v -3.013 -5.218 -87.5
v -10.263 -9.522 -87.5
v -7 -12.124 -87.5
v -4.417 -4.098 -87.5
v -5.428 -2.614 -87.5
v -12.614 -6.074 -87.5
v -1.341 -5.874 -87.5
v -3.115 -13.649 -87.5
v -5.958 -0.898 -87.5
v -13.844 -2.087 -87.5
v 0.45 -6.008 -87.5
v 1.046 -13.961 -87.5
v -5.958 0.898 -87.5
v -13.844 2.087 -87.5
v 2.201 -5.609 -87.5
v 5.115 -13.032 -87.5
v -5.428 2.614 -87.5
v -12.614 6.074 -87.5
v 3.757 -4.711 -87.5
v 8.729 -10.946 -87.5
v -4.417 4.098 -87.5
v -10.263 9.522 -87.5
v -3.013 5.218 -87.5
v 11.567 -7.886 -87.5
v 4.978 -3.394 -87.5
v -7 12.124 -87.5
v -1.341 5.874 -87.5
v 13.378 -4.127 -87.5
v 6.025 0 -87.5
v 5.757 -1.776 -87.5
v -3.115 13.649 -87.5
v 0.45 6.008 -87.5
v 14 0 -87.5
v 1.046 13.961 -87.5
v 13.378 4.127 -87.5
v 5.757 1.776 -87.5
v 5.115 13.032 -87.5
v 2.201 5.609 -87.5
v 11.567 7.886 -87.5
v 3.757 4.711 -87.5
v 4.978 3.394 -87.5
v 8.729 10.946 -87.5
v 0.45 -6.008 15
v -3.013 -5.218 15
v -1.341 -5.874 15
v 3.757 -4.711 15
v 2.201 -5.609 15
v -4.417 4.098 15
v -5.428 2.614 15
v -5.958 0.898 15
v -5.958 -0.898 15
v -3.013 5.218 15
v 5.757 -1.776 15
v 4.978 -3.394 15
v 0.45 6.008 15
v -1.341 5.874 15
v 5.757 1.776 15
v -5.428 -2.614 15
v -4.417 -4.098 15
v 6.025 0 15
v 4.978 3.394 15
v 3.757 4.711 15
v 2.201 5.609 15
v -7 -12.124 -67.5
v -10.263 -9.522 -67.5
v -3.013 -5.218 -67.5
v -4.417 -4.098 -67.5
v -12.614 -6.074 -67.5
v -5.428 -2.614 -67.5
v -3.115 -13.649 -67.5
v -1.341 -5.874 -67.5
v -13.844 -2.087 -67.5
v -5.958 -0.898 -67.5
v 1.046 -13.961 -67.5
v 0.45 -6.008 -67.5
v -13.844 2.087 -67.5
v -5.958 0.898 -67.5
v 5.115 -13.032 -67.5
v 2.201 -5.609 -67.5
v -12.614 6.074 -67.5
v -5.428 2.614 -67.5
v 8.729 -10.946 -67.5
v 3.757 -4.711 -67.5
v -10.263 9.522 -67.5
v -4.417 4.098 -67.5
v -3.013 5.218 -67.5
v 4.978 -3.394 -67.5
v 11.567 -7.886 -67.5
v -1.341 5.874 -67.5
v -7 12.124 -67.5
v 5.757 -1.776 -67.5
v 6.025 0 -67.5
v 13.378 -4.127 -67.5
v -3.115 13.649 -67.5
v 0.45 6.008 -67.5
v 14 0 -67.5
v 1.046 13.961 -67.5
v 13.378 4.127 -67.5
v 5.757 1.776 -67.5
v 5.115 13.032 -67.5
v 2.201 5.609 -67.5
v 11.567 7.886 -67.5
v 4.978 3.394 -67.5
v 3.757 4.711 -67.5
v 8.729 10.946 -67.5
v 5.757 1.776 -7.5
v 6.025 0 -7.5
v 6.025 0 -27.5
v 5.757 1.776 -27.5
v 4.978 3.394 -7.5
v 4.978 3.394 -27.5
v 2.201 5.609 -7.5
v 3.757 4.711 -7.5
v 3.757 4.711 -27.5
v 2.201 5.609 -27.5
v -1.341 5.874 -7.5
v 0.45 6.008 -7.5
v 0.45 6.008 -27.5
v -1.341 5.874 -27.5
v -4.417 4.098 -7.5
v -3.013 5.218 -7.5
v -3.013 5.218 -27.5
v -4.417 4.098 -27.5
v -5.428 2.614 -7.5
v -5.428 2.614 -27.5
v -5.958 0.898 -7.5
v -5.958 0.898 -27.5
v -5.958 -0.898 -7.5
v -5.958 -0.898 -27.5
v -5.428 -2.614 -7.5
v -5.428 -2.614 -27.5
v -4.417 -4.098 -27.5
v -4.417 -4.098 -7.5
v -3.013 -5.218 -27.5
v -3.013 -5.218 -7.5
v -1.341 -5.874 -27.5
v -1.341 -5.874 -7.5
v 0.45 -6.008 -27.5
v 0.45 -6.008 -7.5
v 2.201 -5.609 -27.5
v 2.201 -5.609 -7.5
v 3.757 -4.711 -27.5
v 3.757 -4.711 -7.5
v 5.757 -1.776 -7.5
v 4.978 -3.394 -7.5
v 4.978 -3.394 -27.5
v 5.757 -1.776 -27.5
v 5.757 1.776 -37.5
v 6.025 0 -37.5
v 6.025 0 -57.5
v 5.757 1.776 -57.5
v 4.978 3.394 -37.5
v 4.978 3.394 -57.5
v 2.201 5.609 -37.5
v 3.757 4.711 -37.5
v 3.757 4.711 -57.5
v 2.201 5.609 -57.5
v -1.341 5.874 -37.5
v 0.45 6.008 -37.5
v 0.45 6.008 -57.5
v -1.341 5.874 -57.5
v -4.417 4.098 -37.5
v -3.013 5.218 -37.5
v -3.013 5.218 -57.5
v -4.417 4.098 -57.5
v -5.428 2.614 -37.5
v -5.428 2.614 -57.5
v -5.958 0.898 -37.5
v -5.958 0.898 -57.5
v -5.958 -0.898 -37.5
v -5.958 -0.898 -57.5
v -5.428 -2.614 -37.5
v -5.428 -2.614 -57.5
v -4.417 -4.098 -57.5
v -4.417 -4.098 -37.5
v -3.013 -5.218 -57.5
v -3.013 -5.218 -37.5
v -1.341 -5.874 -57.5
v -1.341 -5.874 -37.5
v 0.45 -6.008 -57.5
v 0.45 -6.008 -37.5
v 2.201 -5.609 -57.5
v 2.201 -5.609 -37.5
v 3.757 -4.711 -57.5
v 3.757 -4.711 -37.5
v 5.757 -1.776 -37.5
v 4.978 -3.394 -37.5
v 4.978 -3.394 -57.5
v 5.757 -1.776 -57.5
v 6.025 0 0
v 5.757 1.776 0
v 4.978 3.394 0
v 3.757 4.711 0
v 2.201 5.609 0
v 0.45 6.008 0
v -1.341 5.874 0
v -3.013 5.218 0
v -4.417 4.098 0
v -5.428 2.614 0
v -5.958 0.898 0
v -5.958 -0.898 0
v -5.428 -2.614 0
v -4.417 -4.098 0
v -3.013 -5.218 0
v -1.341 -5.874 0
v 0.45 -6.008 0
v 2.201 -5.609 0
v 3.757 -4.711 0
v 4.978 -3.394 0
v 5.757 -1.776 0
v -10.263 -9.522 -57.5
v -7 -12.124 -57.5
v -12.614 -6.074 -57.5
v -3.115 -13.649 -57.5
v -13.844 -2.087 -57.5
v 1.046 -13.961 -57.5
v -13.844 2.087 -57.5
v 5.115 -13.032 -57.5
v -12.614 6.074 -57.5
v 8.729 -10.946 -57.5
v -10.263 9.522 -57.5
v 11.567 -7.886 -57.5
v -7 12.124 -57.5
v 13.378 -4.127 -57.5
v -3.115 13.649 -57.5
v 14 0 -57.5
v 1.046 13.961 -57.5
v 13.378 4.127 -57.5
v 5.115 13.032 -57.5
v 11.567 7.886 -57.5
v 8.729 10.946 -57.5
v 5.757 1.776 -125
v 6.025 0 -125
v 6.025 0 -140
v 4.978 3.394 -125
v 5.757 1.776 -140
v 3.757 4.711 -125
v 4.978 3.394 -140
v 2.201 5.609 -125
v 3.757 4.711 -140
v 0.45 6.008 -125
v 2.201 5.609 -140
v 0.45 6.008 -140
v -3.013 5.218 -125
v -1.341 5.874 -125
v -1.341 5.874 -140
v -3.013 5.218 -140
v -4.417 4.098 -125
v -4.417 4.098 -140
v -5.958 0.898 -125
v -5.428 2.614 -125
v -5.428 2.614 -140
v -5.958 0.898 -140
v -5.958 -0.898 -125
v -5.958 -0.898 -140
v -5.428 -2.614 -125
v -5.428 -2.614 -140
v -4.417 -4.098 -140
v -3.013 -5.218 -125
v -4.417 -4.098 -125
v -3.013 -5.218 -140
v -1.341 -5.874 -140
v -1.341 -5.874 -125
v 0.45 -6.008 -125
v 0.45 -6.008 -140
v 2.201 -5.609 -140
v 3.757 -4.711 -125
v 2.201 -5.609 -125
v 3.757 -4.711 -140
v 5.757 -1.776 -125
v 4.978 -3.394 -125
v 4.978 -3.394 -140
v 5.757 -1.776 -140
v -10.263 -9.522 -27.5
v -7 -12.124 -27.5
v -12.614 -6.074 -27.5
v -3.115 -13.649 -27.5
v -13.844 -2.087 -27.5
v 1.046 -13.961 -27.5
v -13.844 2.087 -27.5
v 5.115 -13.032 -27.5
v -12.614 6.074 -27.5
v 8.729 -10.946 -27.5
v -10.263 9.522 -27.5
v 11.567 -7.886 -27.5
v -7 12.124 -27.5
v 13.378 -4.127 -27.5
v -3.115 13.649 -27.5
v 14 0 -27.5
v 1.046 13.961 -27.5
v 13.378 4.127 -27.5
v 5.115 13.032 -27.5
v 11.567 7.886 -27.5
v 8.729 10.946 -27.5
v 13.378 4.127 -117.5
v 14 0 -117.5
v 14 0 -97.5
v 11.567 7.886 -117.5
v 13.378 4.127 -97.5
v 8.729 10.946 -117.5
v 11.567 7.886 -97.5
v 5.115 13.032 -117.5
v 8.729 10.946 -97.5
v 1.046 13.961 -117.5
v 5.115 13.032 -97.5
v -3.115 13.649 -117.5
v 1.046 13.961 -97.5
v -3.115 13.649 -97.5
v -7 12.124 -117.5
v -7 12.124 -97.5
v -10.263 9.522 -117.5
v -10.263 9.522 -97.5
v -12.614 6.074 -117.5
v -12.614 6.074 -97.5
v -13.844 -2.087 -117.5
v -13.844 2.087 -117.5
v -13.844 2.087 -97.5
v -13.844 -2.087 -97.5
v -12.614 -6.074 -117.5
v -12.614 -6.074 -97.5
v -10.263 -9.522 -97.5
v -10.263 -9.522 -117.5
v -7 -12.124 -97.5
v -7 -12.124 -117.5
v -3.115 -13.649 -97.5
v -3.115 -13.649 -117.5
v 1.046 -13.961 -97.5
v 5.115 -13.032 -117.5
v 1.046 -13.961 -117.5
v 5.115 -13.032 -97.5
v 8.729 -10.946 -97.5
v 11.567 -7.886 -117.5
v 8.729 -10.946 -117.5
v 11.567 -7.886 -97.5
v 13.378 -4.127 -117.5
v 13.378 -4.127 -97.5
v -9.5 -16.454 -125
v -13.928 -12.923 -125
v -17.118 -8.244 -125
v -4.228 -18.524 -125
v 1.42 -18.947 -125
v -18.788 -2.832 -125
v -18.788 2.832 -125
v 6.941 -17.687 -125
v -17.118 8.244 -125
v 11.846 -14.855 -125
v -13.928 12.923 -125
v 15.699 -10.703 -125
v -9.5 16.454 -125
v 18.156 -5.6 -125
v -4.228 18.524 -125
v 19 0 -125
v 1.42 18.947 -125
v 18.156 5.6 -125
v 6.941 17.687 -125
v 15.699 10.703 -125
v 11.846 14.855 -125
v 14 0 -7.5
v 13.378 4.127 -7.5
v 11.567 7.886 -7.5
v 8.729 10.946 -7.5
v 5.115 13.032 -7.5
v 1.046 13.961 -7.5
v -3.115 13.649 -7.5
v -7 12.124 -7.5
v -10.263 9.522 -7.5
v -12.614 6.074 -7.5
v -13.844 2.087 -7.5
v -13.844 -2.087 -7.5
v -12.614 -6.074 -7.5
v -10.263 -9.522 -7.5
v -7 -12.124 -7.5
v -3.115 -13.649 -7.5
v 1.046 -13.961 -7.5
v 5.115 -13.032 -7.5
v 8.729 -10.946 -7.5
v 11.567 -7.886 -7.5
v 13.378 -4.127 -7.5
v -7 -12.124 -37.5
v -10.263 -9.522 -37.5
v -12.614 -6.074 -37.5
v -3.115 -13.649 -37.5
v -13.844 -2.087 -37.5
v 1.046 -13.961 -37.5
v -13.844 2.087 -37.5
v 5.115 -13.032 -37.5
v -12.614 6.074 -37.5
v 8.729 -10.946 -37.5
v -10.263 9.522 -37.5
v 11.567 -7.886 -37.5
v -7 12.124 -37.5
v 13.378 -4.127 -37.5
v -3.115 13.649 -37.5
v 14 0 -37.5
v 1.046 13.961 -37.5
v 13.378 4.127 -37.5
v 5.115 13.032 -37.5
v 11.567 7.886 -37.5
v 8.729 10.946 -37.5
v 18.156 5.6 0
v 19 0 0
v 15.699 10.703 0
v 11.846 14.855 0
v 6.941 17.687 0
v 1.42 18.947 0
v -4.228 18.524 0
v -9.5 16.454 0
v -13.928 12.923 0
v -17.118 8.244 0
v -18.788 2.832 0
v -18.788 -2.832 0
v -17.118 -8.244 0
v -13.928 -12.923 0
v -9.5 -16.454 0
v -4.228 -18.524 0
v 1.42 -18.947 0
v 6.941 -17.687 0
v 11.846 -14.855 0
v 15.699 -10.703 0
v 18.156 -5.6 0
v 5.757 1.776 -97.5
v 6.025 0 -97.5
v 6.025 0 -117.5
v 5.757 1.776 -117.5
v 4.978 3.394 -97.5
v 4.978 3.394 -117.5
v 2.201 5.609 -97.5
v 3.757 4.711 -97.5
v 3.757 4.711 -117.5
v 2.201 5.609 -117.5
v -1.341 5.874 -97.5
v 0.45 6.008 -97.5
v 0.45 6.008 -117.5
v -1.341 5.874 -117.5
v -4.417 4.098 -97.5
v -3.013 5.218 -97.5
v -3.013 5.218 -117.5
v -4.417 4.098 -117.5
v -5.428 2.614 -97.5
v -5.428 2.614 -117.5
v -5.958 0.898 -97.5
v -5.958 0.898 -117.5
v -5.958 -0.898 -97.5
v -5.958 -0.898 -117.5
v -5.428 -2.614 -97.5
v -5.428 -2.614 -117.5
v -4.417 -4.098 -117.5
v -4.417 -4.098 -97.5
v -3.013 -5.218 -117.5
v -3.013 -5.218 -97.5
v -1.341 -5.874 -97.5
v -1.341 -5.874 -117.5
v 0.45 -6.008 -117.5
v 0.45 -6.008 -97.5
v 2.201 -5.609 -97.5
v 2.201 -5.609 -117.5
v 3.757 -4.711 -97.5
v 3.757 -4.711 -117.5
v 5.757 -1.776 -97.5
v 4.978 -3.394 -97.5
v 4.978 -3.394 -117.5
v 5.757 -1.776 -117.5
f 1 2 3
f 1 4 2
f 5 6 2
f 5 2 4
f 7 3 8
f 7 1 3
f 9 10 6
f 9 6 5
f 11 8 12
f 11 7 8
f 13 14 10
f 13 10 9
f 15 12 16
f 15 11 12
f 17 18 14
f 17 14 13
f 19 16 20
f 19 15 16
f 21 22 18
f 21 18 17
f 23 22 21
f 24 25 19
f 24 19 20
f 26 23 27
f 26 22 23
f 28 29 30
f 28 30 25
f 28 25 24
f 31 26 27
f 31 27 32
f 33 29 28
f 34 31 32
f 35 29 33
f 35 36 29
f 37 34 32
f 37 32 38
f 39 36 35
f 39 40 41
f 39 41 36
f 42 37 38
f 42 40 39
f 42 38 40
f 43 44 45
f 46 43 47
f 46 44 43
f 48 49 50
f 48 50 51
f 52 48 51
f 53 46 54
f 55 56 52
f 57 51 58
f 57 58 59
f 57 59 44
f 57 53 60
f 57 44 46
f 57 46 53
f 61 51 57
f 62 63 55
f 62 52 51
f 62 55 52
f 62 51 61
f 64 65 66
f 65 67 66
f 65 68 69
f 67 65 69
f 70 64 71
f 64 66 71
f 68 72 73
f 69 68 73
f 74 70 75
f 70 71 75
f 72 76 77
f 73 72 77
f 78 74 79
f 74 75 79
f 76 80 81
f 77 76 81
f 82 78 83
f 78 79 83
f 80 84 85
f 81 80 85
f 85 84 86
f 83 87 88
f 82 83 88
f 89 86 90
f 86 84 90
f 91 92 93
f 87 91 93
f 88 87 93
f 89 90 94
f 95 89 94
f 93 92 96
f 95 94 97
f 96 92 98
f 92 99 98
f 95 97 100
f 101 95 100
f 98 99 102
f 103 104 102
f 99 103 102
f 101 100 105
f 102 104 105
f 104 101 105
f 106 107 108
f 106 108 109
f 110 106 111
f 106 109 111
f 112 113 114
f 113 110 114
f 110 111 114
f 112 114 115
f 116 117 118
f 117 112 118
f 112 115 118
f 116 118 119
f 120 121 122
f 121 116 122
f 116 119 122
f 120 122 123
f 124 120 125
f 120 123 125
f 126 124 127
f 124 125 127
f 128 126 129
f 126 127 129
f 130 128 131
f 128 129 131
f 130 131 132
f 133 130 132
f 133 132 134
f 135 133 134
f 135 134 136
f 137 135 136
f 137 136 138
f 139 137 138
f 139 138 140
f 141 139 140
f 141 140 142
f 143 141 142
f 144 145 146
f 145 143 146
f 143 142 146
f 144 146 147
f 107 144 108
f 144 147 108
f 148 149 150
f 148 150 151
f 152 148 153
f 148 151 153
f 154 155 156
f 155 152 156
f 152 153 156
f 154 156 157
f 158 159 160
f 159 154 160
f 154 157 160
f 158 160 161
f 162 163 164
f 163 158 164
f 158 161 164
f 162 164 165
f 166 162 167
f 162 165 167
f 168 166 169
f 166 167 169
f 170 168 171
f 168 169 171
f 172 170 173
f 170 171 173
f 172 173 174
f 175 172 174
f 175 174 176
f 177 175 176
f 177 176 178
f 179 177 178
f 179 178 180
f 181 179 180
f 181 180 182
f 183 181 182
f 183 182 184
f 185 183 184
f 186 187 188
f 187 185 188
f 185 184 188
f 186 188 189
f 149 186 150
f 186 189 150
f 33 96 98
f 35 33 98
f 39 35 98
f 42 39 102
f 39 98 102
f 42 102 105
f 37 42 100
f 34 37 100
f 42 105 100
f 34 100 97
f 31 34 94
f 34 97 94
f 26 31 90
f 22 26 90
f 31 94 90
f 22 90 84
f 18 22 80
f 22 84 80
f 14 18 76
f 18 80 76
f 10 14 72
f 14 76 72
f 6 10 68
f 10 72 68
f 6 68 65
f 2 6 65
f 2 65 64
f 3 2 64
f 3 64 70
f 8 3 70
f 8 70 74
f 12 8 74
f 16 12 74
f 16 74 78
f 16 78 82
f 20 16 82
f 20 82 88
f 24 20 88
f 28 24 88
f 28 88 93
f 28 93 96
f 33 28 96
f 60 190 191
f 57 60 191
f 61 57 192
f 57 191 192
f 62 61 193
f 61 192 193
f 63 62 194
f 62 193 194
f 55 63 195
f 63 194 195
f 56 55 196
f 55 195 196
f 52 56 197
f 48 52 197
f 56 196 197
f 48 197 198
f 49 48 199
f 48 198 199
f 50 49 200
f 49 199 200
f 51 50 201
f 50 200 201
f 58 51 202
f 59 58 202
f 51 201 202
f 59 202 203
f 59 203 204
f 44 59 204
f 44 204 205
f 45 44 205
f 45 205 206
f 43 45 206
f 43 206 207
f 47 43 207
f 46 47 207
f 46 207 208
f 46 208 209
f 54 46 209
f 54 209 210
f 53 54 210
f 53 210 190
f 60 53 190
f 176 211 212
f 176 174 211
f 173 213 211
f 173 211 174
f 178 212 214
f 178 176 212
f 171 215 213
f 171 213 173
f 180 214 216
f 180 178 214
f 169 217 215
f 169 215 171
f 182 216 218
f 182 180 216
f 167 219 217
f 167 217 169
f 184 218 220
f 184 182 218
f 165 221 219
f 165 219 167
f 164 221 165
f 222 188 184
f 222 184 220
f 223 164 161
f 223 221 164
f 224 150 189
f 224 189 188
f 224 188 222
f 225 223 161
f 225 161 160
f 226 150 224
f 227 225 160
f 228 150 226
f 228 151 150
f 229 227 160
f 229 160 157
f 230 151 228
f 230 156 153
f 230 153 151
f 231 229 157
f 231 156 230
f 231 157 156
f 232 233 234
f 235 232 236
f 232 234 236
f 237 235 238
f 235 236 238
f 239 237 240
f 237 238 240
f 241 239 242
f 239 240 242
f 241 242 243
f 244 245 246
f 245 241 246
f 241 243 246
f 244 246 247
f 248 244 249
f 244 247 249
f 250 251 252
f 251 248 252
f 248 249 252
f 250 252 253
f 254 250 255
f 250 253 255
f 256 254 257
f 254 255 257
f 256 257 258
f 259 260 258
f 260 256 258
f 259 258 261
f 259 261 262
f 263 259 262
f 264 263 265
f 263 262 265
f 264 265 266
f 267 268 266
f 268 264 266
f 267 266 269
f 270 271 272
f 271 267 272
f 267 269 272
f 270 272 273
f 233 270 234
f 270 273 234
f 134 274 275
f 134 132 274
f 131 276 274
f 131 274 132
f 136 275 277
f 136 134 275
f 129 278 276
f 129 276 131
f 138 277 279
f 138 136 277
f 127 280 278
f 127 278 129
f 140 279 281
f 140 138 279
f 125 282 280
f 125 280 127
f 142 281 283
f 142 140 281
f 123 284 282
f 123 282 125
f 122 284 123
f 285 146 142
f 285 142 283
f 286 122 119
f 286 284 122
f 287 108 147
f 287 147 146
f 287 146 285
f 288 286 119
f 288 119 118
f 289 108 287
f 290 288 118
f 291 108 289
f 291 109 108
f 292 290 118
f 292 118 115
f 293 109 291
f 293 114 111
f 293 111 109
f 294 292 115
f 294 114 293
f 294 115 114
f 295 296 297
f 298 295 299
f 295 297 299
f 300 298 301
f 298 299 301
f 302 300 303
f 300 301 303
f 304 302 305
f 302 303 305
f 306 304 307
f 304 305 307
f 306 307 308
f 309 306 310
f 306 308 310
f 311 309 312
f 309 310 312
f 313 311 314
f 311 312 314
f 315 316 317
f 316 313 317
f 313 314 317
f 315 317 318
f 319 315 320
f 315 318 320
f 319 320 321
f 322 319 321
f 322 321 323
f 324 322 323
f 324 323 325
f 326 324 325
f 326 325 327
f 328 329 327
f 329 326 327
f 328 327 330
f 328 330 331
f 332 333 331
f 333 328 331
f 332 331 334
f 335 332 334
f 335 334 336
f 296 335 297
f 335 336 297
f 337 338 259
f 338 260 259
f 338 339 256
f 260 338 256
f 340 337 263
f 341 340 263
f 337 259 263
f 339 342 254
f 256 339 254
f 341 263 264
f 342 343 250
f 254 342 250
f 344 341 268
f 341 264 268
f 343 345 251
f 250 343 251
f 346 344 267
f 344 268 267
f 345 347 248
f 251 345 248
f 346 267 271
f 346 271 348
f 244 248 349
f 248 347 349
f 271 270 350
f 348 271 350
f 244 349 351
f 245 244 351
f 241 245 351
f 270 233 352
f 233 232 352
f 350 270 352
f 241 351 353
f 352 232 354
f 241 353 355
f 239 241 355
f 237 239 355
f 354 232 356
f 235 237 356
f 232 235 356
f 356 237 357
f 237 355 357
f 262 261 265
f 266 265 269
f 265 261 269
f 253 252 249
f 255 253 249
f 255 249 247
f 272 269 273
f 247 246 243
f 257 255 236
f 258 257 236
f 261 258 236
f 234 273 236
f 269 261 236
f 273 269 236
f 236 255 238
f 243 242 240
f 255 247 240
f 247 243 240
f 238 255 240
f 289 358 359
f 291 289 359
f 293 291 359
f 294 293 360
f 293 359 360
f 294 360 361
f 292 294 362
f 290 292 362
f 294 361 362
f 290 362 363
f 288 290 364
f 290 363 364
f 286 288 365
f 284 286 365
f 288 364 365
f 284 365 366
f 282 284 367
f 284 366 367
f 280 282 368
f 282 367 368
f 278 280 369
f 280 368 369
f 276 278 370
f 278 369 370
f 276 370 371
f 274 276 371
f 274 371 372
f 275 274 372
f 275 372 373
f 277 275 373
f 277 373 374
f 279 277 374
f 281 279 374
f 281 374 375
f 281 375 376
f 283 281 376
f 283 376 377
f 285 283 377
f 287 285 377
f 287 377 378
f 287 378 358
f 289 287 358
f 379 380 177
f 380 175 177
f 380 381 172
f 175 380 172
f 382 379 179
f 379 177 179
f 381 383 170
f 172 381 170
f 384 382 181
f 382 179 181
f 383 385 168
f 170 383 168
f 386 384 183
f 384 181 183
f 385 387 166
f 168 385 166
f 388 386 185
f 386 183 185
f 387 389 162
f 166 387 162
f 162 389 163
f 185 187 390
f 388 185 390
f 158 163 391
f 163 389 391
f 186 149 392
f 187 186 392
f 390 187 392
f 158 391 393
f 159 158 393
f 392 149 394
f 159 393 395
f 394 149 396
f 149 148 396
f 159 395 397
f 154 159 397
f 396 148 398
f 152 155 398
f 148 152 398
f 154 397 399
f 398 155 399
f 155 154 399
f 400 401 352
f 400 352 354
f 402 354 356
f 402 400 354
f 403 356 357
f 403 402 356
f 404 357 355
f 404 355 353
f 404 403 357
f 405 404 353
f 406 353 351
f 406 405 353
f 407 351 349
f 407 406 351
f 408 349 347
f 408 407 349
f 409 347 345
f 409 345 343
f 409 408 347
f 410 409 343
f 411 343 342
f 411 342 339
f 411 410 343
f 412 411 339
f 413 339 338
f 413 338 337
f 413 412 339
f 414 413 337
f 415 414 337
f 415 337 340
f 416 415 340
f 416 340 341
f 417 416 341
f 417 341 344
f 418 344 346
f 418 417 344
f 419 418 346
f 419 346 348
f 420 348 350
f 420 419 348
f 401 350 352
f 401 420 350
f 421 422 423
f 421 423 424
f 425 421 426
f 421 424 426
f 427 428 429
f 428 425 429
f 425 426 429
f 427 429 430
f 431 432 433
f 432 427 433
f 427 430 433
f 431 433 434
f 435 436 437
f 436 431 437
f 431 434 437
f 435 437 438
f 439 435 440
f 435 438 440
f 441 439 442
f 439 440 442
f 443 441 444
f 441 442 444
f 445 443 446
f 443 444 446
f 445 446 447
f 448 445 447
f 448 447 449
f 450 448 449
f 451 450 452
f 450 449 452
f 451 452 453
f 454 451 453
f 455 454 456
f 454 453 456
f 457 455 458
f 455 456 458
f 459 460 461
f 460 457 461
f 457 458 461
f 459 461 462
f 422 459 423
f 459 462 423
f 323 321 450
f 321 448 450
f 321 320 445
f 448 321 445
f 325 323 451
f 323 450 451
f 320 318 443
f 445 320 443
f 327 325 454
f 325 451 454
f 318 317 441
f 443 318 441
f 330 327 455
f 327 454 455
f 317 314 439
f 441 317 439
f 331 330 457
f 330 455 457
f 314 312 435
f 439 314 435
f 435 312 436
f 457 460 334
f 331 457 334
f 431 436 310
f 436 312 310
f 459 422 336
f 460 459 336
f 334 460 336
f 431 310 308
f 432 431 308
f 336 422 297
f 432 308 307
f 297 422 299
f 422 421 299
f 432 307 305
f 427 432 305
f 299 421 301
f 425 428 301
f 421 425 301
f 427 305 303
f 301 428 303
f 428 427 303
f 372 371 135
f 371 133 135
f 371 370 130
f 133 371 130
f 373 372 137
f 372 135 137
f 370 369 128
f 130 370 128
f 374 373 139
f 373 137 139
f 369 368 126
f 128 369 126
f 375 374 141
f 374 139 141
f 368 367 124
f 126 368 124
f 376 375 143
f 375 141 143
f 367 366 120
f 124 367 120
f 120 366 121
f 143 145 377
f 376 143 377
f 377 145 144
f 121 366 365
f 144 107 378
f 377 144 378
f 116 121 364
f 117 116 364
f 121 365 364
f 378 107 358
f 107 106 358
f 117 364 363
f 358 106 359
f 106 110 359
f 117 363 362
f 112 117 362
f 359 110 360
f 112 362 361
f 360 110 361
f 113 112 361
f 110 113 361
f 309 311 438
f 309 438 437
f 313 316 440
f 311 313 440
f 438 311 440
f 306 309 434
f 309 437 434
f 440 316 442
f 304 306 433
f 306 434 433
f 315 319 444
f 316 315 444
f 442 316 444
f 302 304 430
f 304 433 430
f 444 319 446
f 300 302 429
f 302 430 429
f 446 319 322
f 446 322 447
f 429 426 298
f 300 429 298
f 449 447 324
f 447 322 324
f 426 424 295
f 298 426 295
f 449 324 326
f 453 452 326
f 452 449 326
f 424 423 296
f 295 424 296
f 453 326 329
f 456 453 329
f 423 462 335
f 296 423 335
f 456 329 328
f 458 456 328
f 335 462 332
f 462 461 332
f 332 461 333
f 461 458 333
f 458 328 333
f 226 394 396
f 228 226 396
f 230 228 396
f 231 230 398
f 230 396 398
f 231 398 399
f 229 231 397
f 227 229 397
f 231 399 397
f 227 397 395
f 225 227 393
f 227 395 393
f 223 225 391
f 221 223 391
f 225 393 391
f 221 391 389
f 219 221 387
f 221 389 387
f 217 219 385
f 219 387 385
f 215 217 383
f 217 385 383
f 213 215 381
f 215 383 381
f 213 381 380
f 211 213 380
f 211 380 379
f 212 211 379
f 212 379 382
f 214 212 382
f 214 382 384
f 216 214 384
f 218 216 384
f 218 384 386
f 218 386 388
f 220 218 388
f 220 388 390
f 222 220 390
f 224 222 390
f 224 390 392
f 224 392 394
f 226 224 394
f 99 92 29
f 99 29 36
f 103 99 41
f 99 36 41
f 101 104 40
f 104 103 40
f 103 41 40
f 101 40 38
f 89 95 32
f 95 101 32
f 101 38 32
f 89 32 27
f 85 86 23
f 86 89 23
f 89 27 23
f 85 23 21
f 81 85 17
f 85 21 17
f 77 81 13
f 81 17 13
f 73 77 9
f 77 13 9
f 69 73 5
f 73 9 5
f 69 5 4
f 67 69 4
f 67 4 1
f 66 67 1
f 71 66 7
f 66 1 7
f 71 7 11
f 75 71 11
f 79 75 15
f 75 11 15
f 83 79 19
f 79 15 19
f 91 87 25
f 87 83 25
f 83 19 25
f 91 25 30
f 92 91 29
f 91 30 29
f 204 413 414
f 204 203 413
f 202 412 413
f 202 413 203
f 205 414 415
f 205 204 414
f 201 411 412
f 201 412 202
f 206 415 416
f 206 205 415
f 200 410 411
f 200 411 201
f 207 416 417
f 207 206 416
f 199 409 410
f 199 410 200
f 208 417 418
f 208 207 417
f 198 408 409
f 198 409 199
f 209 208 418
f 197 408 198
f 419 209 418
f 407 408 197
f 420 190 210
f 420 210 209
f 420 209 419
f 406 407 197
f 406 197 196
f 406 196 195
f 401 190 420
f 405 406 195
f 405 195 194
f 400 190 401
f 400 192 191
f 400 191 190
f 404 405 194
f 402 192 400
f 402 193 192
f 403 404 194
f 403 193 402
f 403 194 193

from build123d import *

# Parameters (mm, degrees)
SKETCH1_R                 = 19
SKETCH1_R_2               = 14
BOSS_EXTRUDE1_DEPTH       = 125
BOSS_EXTRUDE2_START       = 7.5
SKETCH2_R                 = 14
BOSS_EXTRUDE2_DEPTH       = 7.5
CUT_EXTRUDE1_DEPTH        = 121.53319045
CUT_EXTRUDE1_DEPTH_BACK   = 121.53319045
SKETCH4_R                 = 6.025
SKETCH5_R                 = 14
BOSS_EXTRUDE3_DEPTH       = 7.5
BOSS_EXTRUDE4_DEPTH       = 15
BOSS_EXTRUDE4_DEPTH_BACK  = 140
SKETCH7_R                 = 6.025
SKETCH8_R                 = 15
BOSS_EXTRUDE5_DEPTH       = 5
LPATTERN2_COUNT           = 2
LPATTERN2_PITCH           = 30
LPATTERN3_COPY_1_SKETCH_R = 15
LPATTERN3_COPY_1_DEPTH    = 5
LPATTERN3_COPY_2_SKETCH_R = 15
LPATTERN3_COPY_2_DEPTH    = 5


with BuildPart() as part:
    # Sketch1 → Boss-Extrude1 (new body)
    with BuildSketch(Plane.XY):
        Circle(SKETCH1_R)
        Circle(SKETCH1_R_2, mode=Mode.SUBTRACT)
    extrude(amount=-BOSS_EXTRUDE1_DEPTH)

    # Sketch2 → Boss-Extrude2 (add)
    with BuildSketch(Plane.XY.offset(-7.5).offset(BOSS_EXTRUDE2_START)):
        Circle(SKETCH2_R)
    extrude(amount=-BOSS_EXTRUDE2_DEPTH)

    # Sketch4 → Cut-Extrude1 (cut, two sides: drawn at the far end of the back side and taken through both)
    with BuildSketch(Plane.XY.offset(-7.5).offset(-CUT_EXTRUDE1_DEPTH_BACK)):
        Circle(SKETCH4_R)
    extrude(amount=CUT_EXTRUDE1_DEPTH + CUT_EXTRUDE1_DEPTH_BACK, mode=Mode.SUBTRACT)

    # Sketch5 → Boss-Extrude3 (add)
    with BuildSketch(Plane(origin=(0, 0, -117.5), x_dir=(-1, 0, 0), z_dir=(0, 0, -1))):
        with Locations(Location((0, 0, 0), (0, 0, 180))):
            Circle(SKETCH5_R)
    extrude(amount=BOSS_EXTRUDE3_DEPTH)

    # Sketch7 → Boss-Extrude4 (add, two sides: drawn at the far end of the back side and taken through both)
    with BuildSketch(Plane.XY.offset(-BOSS_EXTRUDE4_DEPTH_BACK)):
        Circle(SKETCH7_R)
    extrude(amount=BOSS_EXTRUDE4_DEPTH + BOSS_EXTRUDE4_DEPTH_BACK)

    # Sketch8 → Boss-Extrude5 (add, symmetric)
    with BuildSketch(Plane.XY.offset(-62.5)):
        Circle(SKETCH8_R)
    boss_extrude5 = extrude(amount=BOSS_EXTRUDE5_DEPTH, both=True)

    # LPattern2: Boss-Extrude5 ×2
    with Locations(*[(0, 0, -i * LPATTERN2_PITCH) for i in range(1, LPATTERN2_COUNT)]):
        add(boss_extrude5)

    # LPattern3 copy 1 sketch → LPattern3 copy 1 (add, symmetric)
    with BuildSketch(Plane.XY.offset(-62.5)):
        Circle(LPATTERN3_COPY_1_SKETCH_R)
    extrude(amount=LPATTERN3_COPY_1_DEPTH, both=True)

    # LPattern3 copy 2 sketch → LPattern3 copy 2 (add, symmetric)
    with BuildSketch(Plane.XY.offset(-32.5)):
        Circle(LPATTERN3_COPY_2_SKETCH_R)
    extrude(amount=LPATTERN3_COPY_2_DEPTH, both=True)


solid = part.part
